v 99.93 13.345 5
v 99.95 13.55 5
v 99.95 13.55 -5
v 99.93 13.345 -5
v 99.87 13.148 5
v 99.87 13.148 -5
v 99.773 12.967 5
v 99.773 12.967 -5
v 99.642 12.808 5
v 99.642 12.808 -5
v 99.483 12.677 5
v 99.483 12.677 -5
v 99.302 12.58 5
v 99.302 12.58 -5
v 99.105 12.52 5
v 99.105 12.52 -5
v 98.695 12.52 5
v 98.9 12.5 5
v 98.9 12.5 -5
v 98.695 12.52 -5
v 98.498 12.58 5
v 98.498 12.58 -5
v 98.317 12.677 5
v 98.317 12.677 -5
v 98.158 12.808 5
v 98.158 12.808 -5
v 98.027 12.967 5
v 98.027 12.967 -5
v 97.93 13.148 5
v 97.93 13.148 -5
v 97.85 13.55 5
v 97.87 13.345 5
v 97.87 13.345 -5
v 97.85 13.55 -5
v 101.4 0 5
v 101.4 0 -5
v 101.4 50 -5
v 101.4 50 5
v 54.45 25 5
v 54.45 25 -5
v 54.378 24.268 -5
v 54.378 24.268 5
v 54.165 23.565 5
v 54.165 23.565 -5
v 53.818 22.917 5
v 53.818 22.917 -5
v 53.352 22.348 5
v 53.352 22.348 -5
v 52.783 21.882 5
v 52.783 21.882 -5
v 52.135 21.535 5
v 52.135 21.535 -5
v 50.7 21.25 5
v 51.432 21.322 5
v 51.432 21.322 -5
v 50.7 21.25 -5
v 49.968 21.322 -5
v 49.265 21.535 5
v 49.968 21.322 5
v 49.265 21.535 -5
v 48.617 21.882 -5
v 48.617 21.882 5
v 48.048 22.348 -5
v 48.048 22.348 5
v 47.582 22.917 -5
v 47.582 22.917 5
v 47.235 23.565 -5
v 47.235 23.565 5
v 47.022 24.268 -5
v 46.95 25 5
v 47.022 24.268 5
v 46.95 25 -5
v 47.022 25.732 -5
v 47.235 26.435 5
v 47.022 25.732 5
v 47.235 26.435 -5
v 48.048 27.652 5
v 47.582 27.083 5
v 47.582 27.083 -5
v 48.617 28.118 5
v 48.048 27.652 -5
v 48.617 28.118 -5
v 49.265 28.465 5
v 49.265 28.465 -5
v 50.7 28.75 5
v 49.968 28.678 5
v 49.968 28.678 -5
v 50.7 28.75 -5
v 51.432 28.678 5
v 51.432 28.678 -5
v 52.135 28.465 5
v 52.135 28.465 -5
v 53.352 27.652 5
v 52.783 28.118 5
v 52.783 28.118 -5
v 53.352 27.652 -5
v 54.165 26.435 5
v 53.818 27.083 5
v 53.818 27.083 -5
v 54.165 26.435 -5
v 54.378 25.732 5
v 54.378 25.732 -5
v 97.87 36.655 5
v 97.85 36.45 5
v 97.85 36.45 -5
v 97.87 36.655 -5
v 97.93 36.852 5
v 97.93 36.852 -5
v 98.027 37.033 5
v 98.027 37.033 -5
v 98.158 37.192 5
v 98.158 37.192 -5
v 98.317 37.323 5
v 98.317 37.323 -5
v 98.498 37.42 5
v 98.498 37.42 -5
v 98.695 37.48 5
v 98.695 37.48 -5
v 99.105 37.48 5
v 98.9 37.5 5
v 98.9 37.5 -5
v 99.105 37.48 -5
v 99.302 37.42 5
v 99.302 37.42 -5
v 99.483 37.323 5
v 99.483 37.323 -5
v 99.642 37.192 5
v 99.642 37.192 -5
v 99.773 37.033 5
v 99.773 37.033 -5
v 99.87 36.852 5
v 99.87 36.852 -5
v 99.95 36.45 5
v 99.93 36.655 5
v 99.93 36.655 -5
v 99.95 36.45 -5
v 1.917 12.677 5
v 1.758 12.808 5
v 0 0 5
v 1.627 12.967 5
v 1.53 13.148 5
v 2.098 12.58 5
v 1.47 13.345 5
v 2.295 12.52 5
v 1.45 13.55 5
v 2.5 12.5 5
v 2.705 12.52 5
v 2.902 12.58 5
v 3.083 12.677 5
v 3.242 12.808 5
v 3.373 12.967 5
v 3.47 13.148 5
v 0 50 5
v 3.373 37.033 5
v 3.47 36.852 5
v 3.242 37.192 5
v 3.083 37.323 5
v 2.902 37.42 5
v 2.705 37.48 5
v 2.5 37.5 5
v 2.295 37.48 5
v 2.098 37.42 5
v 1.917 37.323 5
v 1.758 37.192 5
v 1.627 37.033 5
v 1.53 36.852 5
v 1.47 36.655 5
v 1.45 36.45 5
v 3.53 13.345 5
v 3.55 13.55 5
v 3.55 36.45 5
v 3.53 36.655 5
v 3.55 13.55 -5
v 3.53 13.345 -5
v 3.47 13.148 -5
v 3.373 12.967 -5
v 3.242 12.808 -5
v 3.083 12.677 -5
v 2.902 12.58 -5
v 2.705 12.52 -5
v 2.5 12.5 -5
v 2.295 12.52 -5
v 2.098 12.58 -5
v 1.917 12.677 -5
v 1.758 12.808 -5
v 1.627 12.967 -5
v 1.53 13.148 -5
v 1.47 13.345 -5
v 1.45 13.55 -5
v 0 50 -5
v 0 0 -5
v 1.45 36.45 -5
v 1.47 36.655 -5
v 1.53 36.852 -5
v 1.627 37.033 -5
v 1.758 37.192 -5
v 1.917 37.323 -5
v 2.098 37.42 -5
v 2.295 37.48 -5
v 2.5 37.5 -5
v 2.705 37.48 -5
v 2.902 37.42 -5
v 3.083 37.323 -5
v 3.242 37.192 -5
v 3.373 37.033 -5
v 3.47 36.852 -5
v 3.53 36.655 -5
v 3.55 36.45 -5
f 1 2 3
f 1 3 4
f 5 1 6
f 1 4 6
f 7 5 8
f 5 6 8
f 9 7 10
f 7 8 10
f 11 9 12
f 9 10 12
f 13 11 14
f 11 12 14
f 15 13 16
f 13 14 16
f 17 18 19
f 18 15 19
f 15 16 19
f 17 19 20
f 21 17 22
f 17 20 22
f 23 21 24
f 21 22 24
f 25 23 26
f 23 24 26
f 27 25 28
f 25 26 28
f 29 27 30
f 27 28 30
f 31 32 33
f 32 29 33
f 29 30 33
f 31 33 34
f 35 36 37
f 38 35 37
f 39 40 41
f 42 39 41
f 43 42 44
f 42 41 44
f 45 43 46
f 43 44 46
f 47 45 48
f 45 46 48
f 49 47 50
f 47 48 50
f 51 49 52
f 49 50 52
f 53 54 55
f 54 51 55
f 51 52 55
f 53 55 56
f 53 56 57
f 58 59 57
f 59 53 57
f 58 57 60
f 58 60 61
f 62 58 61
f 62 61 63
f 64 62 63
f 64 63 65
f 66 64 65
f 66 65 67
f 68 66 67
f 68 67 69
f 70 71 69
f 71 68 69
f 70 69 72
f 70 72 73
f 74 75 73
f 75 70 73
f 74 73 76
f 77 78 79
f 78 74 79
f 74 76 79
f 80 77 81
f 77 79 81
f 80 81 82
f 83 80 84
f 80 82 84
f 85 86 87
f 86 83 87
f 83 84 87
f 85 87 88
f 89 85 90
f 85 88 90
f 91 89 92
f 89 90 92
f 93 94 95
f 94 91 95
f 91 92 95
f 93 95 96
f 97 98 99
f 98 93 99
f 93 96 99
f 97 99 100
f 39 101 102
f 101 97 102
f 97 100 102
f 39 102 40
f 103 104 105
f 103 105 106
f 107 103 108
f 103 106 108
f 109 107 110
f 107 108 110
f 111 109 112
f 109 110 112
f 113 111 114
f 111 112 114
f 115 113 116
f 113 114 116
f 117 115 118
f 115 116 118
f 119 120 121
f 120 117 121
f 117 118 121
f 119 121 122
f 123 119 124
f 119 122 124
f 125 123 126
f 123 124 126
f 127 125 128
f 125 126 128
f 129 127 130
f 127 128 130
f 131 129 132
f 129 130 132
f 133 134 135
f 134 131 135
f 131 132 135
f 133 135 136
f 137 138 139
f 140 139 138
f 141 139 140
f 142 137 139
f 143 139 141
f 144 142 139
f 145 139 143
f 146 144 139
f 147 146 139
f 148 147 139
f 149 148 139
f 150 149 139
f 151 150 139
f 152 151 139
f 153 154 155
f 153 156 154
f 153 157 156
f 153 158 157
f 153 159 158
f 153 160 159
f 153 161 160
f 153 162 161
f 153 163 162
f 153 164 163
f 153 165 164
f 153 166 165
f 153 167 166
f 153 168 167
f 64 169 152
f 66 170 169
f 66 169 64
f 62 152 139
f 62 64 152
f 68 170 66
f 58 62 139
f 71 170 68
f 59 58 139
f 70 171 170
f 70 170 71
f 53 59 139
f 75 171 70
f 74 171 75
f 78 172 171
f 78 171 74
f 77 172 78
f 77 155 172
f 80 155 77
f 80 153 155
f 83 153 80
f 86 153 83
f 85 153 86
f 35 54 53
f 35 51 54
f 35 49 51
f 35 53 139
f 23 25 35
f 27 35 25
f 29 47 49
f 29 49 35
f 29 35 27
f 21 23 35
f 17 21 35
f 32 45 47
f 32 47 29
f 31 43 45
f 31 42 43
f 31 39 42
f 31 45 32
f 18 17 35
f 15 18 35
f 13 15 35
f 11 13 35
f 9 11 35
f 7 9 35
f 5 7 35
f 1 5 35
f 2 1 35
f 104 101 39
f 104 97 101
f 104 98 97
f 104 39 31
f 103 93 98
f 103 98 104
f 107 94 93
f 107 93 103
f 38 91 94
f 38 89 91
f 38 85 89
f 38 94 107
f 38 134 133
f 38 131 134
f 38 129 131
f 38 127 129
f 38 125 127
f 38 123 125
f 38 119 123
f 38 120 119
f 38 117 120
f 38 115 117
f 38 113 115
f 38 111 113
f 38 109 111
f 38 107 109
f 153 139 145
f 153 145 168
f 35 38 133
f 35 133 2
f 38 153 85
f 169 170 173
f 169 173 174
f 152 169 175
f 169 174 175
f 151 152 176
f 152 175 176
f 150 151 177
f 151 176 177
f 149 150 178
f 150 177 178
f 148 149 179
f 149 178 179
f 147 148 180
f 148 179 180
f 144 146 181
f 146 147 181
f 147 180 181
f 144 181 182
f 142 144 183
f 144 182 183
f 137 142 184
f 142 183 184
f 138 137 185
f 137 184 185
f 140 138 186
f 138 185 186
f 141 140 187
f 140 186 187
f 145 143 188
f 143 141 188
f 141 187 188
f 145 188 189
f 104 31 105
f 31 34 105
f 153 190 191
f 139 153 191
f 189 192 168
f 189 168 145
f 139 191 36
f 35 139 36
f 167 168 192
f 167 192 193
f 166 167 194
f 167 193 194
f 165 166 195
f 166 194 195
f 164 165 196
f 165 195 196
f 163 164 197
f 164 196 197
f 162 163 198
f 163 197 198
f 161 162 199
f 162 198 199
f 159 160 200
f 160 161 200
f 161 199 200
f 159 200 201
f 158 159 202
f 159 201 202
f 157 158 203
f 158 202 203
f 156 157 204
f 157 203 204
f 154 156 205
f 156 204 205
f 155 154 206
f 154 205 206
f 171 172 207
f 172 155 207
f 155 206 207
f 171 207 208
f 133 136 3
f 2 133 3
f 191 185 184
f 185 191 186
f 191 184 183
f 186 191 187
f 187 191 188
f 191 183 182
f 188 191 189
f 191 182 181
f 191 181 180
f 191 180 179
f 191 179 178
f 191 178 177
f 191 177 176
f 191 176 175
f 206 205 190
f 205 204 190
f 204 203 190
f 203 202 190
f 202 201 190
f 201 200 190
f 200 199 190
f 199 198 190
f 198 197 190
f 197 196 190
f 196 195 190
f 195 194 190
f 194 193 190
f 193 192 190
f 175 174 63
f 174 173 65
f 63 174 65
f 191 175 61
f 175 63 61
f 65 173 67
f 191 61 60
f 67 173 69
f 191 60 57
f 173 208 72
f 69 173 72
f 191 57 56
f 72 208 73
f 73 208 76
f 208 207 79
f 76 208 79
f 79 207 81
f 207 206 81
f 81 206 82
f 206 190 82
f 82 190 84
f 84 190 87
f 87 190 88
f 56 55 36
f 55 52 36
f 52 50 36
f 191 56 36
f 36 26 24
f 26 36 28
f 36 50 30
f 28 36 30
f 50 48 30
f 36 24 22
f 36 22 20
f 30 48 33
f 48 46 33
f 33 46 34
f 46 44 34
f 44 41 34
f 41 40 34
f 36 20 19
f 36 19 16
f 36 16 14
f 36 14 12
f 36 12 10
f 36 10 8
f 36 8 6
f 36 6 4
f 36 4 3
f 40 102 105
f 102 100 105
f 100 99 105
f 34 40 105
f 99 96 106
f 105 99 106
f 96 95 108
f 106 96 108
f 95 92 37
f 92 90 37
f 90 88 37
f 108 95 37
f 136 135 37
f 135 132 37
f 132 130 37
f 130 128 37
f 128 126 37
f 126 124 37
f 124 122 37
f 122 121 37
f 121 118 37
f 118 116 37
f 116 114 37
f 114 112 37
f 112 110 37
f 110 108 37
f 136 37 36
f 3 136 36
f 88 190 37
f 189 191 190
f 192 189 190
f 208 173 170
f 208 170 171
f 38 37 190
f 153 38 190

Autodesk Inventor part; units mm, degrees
ref_plane "YZ Plane" through (0, 0, 0) normal (1, 0, 0) x (0, 1, 0)
ref_plane "XZ Plane" through (0, 0, 0) normal (0, 1, 0) x (-1, 0, 0)
ref_plane "XY Plane" through (0, 0, 0) normal (0, 0, 1) x (1, 0, 0)
sketch "Sketch1" plane through (0, 0, 0) normal (0, 0, 1) x (1, 0, 0)
  line L0 (0, 0) -> (101.4, 0)
  line L1 (101.4, 0) -> (101.4, 50)
  line L2 (101.4, 50) -> (0, 50)
  line L3 (0, 50) -> (0, 0)
  circle A0 centre (50.7, 25) radius 3.75
  line L4 (2.5, 36.45) -> (2.5, 13.55) construction
  line L5 (1.45, 36.45) -> (1.45, 13.55)
  line L6 (3.55, 13.55) -> (3.55, 36.45)
  arc A1 (3.55, 36.45) -> (1.45, 36.45) centre (2.5, 36.45) ccw
  arc A2 (1.45, 13.55) -> (3.55, 13.55) centre (2.5, 13.55) ccw
  line L7 (101.4, 50) -> (101.4, 0)
  line L8 (98.9, 36.45) -> (98.9, 13.55) construction
  line L9 (99.95, 36.45) -> (99.95, 13.55)
  line L10 (97.85, 13.55) -> (97.85, 36.45)
  arc A3 (99.95, 36.45) -> (97.85, 36.45) centre (98.9, 36.45) ccw
  arc A4 (97.85, 13.55) -> (99.95, 13.55) centre (98.9, 13.55) ccw
  point P0 (2.5, 25)
  point P1 (2.5, 12.5)
  point P2 (2.5, 37.5)
  point P3 (98.9, 25)
  point P4 (98.9, 12.5)
  point P5 (98.9, 37.5)
  point P6 (98.9, 25)
  dimension "d2" = 101.4
  dimension "d3" = 50
  dimension "d23" = 7.5
  dimension "d24" = 25
  dimension "d26" = 2.1
  dimension "d28" = 25
  dimension "d29" = 25
  dimension "d31" = 2.5
extrude "Extrusion1" add sketch "Sketch1" along normal mid plane 10
